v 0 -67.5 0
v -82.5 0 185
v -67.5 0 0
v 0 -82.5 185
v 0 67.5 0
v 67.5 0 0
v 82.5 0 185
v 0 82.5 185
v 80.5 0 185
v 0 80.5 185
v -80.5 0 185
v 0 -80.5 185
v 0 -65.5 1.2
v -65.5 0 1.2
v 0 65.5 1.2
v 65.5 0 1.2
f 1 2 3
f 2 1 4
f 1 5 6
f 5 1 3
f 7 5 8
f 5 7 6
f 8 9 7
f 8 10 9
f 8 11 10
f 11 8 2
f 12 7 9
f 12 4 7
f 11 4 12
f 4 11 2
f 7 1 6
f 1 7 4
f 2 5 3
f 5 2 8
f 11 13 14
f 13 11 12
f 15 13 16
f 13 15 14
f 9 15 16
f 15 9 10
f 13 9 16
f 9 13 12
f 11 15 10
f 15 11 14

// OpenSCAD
$fn=4;
inside_diameter=50;
outside_diameter=inside_diameter+4;

end_diameter=110;
end_diameter_inside=end_diameter-4;
basket_width=230-end_diameter;
basket_depth=110;
basket_depth_inside=basket_depth-4;
basket_height=200;
basket_height_inside=basket_height+1;

lid_height = 20;


module lid()
{
  difference()
  {
    union()
    {
      cylinder( h = 185, d1 = 135, d2 = 165 );
    }
    translate([ 0, 0, 1.2 ])
    cylinder( h = 183.8, d1 = 131, d2 = 161 );
  }
}


lid();
